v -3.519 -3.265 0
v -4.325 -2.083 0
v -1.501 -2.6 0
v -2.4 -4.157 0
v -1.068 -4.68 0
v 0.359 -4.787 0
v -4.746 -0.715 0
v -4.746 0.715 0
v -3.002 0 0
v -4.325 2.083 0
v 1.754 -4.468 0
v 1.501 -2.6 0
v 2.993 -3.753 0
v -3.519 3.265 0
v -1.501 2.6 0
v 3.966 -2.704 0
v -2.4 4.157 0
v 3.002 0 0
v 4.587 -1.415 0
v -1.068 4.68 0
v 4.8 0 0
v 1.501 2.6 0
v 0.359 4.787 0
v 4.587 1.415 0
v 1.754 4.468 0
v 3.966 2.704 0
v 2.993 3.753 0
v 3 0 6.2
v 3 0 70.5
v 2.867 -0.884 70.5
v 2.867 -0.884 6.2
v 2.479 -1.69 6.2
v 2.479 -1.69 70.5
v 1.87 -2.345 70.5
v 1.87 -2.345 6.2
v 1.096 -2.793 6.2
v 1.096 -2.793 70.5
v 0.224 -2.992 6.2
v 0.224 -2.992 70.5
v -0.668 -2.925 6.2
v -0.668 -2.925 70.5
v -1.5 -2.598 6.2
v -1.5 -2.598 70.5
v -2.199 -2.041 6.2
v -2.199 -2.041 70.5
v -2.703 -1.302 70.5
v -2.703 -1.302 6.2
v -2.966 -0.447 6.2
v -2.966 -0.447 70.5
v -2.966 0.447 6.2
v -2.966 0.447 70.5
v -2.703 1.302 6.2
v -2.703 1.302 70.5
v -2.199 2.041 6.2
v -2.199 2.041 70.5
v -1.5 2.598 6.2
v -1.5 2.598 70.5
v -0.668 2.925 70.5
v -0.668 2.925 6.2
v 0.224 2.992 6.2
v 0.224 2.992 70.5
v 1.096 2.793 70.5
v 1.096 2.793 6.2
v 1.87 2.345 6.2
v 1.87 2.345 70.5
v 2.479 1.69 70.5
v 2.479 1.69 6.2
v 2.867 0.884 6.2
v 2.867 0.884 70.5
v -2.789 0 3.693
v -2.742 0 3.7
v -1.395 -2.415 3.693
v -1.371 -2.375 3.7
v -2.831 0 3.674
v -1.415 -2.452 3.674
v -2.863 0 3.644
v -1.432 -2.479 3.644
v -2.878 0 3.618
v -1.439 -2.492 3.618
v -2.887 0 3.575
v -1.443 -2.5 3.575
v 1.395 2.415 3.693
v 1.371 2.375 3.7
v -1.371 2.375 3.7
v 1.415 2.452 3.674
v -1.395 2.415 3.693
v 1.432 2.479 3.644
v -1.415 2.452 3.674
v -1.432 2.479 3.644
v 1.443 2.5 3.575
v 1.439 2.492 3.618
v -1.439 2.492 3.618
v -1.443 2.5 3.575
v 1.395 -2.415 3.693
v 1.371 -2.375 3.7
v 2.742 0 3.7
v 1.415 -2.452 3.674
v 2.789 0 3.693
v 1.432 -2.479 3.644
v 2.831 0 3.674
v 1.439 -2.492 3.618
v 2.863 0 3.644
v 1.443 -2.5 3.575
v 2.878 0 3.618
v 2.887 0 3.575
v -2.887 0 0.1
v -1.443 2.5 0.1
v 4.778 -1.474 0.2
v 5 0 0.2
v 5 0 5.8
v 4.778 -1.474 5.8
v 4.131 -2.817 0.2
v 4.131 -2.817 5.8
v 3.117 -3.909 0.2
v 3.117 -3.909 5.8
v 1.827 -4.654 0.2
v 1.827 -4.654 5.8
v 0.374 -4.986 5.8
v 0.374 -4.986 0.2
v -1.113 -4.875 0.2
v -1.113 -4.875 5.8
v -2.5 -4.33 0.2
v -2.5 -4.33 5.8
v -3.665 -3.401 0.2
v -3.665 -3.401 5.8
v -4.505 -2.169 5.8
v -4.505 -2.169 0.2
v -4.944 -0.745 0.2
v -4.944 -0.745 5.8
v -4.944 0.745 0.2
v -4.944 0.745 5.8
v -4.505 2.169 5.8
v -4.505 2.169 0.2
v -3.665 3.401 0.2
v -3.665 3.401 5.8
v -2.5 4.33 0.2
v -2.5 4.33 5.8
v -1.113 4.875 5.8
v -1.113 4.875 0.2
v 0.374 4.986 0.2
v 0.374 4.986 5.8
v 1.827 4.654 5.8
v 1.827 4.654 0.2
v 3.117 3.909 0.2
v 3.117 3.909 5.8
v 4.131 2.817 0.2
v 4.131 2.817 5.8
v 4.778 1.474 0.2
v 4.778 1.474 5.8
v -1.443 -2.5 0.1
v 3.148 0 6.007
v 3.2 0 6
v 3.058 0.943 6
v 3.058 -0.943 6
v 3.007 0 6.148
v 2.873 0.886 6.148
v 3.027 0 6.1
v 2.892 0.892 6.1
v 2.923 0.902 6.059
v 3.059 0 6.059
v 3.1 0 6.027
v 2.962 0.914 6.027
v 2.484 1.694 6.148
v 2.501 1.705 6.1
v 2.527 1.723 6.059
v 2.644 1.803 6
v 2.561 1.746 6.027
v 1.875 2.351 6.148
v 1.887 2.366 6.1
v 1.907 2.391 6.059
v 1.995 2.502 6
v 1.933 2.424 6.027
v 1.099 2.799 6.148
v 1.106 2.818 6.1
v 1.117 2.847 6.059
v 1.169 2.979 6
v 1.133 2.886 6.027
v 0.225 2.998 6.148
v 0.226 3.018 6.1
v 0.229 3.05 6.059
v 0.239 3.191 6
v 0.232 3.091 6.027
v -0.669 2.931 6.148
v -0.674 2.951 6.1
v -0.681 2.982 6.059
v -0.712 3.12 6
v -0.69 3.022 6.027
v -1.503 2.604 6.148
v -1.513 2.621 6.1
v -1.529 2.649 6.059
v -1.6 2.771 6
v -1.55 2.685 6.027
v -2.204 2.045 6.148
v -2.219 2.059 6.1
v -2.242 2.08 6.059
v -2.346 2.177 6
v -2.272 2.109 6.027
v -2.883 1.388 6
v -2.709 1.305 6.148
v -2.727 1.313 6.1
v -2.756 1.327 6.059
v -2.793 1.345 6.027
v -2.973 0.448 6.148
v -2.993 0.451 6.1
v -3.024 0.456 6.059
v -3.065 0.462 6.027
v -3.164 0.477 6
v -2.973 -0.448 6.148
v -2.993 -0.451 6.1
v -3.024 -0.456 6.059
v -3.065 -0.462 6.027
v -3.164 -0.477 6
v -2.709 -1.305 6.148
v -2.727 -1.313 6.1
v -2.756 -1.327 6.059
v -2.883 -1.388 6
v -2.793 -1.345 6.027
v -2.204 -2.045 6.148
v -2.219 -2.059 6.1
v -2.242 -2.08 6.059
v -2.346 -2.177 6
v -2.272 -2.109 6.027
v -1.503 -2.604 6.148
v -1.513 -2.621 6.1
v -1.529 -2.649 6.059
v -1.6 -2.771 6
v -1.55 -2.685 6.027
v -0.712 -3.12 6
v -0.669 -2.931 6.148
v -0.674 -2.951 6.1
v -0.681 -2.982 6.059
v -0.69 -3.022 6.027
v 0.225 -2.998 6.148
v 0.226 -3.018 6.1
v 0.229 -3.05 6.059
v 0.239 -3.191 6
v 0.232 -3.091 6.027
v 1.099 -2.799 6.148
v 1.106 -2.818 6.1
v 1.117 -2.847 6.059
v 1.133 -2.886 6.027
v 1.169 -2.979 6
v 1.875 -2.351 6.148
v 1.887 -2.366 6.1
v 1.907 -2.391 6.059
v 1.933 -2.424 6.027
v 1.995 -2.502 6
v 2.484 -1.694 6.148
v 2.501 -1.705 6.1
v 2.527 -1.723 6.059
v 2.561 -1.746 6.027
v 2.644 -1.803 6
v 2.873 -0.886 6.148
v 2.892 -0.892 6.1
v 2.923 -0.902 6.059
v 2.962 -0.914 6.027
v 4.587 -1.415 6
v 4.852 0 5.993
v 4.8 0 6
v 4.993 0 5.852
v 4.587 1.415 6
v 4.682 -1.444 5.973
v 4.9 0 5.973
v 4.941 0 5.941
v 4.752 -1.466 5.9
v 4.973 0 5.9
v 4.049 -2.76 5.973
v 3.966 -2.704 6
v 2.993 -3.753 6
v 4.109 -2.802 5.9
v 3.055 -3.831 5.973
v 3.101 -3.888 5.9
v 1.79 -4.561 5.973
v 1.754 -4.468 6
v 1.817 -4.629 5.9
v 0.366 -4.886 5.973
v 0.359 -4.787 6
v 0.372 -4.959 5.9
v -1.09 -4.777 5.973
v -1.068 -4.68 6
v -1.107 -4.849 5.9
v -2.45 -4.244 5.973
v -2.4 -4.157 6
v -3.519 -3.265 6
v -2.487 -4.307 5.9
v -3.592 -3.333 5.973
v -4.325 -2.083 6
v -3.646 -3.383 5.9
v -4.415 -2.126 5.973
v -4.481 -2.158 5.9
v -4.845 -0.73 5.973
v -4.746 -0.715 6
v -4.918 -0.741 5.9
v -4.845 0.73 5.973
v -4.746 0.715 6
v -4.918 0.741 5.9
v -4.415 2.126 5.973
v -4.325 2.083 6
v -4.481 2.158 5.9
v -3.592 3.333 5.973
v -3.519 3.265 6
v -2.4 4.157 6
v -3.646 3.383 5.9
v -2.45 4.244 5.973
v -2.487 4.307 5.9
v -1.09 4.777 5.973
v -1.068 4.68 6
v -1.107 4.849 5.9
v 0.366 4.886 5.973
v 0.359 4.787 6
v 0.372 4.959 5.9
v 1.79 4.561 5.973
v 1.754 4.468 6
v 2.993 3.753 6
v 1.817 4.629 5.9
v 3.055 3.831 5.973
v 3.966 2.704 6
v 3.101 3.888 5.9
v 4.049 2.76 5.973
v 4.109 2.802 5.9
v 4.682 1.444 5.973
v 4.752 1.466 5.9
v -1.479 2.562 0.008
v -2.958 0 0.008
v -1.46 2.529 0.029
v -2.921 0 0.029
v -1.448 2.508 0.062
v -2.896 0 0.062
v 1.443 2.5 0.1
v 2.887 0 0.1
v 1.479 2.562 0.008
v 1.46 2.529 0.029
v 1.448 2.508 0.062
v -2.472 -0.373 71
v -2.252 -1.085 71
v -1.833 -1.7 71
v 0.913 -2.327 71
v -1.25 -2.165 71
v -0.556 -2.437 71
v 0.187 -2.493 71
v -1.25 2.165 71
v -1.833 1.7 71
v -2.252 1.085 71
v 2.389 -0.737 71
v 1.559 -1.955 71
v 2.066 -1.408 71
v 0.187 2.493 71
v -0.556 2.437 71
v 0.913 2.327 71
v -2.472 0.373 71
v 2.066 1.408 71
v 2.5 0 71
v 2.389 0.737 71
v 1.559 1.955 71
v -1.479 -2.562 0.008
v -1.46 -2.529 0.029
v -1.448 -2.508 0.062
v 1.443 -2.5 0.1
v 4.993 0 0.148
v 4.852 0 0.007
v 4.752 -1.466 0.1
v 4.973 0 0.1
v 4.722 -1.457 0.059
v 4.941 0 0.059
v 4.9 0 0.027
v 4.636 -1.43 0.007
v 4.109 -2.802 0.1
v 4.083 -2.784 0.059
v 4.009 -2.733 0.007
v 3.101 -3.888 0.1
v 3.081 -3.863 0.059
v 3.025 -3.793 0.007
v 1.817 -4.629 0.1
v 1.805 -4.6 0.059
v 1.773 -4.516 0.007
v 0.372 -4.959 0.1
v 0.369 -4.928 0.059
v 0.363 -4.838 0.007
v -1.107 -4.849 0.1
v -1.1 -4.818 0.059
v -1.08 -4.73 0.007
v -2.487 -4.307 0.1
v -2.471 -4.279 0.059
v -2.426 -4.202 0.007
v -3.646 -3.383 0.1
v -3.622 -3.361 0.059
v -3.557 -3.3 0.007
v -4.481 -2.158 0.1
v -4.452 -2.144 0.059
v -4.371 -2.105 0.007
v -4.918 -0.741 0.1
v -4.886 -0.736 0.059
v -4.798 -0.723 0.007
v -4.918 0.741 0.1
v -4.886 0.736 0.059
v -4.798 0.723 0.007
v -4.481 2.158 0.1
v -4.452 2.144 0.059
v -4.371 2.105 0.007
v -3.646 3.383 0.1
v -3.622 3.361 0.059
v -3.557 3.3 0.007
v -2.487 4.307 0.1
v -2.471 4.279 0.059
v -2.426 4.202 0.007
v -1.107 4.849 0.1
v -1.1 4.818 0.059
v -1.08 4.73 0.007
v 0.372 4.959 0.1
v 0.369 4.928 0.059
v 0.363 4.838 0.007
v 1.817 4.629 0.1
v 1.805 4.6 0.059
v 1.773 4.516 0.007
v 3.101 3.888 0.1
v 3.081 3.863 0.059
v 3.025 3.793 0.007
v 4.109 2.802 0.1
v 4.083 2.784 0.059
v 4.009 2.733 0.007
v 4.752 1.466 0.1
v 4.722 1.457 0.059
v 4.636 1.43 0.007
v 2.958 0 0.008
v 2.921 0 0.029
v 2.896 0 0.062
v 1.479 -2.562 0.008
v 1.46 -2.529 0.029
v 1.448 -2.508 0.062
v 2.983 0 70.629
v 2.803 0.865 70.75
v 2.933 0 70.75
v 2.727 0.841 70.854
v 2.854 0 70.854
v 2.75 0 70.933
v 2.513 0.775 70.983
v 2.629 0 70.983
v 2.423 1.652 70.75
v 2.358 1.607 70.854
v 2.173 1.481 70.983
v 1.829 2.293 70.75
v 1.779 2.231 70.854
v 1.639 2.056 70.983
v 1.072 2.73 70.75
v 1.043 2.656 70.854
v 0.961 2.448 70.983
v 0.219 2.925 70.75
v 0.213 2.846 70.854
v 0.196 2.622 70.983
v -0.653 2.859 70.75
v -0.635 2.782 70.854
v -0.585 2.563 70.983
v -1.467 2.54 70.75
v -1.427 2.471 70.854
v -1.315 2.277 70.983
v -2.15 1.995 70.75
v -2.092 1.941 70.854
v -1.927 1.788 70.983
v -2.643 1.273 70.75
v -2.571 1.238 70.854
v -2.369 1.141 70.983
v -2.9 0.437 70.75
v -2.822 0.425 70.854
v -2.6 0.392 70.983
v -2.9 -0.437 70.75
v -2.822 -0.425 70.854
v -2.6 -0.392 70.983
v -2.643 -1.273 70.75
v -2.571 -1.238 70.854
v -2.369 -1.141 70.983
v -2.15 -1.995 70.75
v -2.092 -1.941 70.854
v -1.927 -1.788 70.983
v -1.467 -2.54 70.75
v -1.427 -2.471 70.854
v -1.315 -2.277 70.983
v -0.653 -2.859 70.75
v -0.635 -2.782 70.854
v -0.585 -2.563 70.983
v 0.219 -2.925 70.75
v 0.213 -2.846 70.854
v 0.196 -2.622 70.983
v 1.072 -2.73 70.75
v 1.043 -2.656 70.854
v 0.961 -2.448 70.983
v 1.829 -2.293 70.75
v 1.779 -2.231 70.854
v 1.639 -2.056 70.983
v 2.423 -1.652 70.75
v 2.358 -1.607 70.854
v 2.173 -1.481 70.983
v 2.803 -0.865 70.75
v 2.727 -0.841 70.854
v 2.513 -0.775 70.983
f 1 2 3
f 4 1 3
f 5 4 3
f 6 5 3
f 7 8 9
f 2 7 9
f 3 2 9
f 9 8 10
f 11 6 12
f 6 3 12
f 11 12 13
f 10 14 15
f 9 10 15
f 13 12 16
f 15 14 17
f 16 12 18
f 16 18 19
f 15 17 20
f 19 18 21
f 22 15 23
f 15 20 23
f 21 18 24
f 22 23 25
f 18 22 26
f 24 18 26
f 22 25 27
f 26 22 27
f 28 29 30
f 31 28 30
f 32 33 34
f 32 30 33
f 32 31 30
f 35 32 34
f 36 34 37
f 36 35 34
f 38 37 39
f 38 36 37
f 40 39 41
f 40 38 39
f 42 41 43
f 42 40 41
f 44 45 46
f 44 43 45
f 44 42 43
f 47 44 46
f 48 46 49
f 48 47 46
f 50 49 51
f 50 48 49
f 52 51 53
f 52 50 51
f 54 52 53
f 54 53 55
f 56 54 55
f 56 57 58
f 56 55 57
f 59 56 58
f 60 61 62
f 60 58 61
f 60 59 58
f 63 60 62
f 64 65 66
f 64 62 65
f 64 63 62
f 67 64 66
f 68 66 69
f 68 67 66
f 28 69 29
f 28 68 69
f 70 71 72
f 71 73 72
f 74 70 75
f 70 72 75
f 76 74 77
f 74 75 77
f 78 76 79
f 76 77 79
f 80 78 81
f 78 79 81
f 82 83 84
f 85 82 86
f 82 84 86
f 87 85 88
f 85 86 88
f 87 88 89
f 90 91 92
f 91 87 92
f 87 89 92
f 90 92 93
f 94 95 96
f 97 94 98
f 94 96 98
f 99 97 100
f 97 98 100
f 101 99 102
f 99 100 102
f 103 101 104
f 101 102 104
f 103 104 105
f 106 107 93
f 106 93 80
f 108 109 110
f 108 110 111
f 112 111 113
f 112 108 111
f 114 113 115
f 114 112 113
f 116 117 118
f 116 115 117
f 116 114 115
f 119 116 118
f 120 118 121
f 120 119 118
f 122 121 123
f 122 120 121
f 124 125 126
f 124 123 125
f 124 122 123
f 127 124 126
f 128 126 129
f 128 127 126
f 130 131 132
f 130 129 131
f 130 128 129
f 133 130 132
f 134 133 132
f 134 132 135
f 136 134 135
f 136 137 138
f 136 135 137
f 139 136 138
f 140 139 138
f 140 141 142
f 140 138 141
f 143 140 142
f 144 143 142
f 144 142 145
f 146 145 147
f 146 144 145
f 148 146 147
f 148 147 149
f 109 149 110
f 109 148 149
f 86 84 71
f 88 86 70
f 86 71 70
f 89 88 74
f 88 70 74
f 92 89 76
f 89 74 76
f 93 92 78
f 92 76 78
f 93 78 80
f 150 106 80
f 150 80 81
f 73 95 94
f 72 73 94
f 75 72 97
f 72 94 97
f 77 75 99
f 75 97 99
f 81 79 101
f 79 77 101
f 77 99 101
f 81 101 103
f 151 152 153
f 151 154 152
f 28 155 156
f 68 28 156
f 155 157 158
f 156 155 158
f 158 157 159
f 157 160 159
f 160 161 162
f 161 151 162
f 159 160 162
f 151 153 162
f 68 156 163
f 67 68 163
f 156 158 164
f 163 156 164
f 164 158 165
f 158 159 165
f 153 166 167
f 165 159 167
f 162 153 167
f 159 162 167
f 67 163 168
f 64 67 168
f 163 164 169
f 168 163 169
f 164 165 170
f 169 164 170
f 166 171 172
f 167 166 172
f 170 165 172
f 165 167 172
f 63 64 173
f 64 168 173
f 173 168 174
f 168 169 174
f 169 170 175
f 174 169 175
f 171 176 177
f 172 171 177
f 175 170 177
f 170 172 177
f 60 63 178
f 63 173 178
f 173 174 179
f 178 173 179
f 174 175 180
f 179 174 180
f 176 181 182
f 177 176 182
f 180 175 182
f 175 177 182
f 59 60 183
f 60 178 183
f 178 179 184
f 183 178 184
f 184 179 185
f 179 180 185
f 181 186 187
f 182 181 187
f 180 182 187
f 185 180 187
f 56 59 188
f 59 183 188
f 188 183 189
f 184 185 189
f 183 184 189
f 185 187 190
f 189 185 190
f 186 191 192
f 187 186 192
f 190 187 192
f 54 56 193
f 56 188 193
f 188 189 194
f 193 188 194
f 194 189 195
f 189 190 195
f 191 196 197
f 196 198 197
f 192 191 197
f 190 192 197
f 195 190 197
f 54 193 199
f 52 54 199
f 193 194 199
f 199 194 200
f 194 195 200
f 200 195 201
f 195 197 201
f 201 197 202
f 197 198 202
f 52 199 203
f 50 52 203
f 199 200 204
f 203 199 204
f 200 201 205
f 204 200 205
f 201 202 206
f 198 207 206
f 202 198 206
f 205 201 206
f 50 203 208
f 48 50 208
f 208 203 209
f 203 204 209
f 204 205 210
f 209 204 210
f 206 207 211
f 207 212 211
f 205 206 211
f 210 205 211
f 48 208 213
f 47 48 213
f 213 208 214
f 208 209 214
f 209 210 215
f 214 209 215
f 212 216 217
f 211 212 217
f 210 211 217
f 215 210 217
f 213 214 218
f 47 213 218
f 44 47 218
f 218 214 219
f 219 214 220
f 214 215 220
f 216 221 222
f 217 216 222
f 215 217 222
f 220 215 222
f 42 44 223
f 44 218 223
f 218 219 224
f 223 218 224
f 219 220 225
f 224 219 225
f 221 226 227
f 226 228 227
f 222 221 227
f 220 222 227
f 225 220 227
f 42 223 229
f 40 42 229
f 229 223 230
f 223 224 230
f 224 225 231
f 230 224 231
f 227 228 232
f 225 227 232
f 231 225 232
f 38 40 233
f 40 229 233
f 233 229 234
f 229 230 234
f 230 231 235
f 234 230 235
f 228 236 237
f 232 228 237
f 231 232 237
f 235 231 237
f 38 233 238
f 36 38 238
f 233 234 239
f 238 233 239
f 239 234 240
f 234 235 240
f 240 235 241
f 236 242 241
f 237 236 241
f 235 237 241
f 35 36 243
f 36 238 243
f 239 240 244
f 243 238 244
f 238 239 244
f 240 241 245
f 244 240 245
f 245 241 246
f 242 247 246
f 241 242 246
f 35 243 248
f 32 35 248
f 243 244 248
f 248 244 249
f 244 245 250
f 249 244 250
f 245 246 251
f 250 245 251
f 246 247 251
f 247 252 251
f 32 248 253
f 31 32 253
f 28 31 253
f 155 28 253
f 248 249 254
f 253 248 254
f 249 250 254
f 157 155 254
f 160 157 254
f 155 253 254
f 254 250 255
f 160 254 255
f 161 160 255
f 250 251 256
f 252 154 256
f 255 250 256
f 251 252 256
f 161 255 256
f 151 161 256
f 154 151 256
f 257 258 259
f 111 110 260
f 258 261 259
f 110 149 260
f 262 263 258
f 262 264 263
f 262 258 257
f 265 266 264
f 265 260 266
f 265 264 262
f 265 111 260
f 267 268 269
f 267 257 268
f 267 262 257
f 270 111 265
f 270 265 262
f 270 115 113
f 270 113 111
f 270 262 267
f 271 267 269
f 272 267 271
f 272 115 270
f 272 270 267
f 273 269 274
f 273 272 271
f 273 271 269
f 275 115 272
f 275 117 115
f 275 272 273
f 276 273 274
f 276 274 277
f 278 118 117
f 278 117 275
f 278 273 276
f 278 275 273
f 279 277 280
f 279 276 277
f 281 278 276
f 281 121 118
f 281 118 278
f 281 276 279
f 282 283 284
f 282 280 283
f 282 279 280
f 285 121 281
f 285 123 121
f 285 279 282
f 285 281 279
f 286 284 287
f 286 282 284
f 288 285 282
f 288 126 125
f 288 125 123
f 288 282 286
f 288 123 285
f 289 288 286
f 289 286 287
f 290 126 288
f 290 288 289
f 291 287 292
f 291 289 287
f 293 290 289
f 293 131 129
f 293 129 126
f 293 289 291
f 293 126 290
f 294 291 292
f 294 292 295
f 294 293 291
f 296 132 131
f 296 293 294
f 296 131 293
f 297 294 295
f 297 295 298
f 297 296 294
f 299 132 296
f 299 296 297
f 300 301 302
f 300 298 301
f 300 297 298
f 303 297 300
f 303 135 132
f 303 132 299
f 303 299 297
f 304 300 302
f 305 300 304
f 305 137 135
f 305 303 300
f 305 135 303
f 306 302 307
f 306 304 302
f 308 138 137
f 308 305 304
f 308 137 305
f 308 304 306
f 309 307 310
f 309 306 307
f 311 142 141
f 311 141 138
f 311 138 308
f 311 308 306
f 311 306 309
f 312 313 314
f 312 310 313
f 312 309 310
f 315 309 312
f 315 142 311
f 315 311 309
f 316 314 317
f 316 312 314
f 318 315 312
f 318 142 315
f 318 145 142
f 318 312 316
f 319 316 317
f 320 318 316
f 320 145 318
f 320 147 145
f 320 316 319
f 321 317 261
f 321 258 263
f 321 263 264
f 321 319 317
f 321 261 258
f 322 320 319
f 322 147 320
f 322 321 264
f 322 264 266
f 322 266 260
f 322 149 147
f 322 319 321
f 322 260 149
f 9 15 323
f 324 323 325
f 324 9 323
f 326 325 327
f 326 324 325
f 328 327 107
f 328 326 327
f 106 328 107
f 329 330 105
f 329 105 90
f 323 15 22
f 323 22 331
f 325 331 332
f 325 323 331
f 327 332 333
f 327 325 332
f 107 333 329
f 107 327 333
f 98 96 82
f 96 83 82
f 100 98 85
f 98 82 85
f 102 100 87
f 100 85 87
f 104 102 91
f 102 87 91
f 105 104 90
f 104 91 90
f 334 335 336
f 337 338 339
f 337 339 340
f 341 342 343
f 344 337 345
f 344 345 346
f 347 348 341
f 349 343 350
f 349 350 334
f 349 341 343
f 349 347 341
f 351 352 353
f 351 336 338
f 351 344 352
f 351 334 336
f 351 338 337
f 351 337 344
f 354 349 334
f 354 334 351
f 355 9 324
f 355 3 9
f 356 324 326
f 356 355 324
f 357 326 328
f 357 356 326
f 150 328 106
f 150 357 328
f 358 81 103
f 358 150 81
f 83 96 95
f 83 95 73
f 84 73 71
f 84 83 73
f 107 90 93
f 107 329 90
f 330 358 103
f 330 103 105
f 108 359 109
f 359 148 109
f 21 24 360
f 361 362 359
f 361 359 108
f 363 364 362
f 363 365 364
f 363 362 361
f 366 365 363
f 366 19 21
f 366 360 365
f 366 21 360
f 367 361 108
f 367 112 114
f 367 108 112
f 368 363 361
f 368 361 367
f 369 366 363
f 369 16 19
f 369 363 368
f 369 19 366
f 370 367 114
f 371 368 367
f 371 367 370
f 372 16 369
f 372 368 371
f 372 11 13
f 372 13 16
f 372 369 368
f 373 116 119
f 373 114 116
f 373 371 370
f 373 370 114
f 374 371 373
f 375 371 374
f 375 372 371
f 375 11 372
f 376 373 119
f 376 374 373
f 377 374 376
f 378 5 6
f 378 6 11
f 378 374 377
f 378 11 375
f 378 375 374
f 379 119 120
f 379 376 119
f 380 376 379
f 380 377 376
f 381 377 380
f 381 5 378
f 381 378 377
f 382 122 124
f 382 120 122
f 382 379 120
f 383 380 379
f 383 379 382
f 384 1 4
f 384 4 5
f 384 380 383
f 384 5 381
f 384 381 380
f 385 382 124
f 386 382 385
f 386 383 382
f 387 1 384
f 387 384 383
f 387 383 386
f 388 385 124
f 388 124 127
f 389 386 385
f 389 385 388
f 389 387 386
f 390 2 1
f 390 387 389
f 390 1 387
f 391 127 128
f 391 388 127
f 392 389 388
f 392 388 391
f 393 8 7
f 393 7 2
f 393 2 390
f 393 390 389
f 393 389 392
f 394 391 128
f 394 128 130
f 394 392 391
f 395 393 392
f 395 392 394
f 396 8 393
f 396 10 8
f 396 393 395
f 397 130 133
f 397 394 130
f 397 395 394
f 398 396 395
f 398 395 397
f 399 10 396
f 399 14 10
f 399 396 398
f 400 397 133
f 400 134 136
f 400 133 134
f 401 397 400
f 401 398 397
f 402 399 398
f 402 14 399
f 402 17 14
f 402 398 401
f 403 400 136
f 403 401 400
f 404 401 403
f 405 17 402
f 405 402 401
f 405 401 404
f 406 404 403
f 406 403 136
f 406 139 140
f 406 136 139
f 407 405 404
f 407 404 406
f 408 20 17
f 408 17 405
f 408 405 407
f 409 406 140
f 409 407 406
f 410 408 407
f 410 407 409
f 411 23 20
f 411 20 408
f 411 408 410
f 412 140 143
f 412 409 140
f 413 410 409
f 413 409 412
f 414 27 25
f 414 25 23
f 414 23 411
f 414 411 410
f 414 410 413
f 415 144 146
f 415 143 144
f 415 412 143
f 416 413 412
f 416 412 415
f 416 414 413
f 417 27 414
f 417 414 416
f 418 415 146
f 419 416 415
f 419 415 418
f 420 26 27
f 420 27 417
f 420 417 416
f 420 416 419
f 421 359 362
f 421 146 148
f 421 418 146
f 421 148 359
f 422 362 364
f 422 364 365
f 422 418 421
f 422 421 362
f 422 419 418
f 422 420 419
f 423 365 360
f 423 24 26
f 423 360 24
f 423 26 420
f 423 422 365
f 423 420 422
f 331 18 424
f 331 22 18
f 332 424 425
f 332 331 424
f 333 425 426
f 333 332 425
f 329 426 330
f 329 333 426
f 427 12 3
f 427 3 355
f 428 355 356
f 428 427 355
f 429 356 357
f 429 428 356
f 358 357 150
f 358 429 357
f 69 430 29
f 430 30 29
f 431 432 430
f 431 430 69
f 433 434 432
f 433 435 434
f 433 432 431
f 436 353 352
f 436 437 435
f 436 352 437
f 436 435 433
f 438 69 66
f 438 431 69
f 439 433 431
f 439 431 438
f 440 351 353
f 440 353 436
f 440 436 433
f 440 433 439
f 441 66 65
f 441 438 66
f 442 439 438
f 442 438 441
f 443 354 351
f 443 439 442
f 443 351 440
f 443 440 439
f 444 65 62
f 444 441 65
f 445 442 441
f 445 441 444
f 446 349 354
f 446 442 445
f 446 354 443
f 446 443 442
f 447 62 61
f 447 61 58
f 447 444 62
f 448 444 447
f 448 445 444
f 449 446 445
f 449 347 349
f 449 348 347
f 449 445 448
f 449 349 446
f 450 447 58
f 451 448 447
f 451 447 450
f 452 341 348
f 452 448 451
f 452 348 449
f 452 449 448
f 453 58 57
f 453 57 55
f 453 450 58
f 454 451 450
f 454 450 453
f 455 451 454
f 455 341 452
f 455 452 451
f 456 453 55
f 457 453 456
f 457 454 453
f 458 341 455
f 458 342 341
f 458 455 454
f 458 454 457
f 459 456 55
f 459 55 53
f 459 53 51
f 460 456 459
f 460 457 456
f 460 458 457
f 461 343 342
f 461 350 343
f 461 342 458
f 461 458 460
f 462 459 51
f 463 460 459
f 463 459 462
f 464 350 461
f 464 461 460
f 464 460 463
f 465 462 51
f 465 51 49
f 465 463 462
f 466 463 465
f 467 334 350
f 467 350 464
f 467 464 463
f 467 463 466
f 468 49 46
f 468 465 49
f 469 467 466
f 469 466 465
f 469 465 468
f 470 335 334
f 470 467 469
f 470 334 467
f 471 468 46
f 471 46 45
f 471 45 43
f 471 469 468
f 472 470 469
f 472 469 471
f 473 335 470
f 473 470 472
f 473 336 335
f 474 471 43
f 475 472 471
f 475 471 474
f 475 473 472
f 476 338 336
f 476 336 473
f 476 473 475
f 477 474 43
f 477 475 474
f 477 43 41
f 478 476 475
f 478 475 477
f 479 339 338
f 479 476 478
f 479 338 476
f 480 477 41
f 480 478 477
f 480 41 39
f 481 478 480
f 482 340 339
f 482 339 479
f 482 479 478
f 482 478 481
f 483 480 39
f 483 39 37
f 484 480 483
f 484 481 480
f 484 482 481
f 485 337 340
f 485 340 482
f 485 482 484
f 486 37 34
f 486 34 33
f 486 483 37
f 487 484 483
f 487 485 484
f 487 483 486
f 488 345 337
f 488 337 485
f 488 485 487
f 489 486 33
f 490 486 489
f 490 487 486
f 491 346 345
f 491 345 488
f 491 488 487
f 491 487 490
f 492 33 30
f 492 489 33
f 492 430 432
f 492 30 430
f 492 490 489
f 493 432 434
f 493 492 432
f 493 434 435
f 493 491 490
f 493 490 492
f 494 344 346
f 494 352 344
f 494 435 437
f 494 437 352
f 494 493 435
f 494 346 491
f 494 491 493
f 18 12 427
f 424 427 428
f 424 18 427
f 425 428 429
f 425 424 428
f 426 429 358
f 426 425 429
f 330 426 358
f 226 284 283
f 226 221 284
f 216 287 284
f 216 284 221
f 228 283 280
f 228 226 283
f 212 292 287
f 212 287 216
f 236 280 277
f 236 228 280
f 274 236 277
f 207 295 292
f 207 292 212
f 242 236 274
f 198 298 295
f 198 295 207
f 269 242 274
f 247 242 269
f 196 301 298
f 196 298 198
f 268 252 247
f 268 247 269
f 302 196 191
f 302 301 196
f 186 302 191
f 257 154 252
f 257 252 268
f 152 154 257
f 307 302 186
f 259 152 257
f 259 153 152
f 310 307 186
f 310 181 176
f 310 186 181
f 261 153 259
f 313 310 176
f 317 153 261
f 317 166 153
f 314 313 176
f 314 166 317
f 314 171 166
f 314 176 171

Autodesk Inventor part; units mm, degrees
ref_plane "YZ Plane" through (0, 0, 0) normal (1, 0, 0) x (0, 1, 0)
ref_plane "XZ Plane" through (0, 0, 0) normal (0, 1, 0) x (-1, 0, 0)
ref_plane "XY Plane" through (0, 0, 0) normal (0, 0, 1) x (1, 0, 0)
sketch "Sketch1" plane through (0, 0, 0) normal (0, 0, 1) x (1, 0, 0)
  circle A0 centre (0, 0) radius 5
  dimension "d0" = 10
extrude "Extrusion1" add sketch "Sketch1" along normal blind 6
sketch "Sketch2" plane through (0, 0, 6) normal (0, 0, 1) x (1, 0, 0)
  circle A0 centre (0, 0) radius 3
  dimension "d3" = 6
extrude "Extrusion2" add sketch "Sketch2" along normal blind 65
thread "Thread1" size "M6x1" class "6g" standard "ISO Metric profile" length 24
fillet "Fillet2" radius 0.5 1 edges at (-3, 0, 71)
fillet "Fillet3" radius 0.2 3 edges at (-5, 0, 6) (-3, 0, 6) (-5, 0, 0)
sketch "Sketch5" plane through (0, 0, 0) normal (0, 0, -1) x (-1, 0, 0)
  line L0 (2.8868, 0) -> (1.4434, -2.5)
  line L1 (1.4434, -2.5) -> (-1.4434, -2.5)
  line L2 (-1.4434, -2.5) -> (-2.8868, 0)
  line L3 (-2.8868, 0) -> (-1.4434, 2.5)
  line L4 (-1.4434, 2.5) -> (1.4434, 2.5)
  line L5 (1.4434, 2.5) -> (2.8868, 0)
  point P0 (0, 0)
  point P1 (0, 0)
  dimension "d15" = 5
extrude "Extrusion4" cut sketch "Sketch5" against normal blind 3.7
fillet "Fillet6" radius 0.125 6 edges at (-2.1651, -1.25, 3.7) (0, -2.5, 3.7) (0, 2.5, 3.7) (-2.1651, 1.25, 3.7) (2.1651, -1.25, 3.7) (2.1651, 1.25, 3.7)
fillet "Fillet7" radius 0.1 6 edges at (-2.1651, -1.25, 0) (0, -2.5, 0) (2.1651, -1.25, 0) (2.1651, 1.25, 0) (0, 2.5, 0) (-2.1651, 1.25, 0)
properties part number "MM-MMount_to_Frame-Bolt"
